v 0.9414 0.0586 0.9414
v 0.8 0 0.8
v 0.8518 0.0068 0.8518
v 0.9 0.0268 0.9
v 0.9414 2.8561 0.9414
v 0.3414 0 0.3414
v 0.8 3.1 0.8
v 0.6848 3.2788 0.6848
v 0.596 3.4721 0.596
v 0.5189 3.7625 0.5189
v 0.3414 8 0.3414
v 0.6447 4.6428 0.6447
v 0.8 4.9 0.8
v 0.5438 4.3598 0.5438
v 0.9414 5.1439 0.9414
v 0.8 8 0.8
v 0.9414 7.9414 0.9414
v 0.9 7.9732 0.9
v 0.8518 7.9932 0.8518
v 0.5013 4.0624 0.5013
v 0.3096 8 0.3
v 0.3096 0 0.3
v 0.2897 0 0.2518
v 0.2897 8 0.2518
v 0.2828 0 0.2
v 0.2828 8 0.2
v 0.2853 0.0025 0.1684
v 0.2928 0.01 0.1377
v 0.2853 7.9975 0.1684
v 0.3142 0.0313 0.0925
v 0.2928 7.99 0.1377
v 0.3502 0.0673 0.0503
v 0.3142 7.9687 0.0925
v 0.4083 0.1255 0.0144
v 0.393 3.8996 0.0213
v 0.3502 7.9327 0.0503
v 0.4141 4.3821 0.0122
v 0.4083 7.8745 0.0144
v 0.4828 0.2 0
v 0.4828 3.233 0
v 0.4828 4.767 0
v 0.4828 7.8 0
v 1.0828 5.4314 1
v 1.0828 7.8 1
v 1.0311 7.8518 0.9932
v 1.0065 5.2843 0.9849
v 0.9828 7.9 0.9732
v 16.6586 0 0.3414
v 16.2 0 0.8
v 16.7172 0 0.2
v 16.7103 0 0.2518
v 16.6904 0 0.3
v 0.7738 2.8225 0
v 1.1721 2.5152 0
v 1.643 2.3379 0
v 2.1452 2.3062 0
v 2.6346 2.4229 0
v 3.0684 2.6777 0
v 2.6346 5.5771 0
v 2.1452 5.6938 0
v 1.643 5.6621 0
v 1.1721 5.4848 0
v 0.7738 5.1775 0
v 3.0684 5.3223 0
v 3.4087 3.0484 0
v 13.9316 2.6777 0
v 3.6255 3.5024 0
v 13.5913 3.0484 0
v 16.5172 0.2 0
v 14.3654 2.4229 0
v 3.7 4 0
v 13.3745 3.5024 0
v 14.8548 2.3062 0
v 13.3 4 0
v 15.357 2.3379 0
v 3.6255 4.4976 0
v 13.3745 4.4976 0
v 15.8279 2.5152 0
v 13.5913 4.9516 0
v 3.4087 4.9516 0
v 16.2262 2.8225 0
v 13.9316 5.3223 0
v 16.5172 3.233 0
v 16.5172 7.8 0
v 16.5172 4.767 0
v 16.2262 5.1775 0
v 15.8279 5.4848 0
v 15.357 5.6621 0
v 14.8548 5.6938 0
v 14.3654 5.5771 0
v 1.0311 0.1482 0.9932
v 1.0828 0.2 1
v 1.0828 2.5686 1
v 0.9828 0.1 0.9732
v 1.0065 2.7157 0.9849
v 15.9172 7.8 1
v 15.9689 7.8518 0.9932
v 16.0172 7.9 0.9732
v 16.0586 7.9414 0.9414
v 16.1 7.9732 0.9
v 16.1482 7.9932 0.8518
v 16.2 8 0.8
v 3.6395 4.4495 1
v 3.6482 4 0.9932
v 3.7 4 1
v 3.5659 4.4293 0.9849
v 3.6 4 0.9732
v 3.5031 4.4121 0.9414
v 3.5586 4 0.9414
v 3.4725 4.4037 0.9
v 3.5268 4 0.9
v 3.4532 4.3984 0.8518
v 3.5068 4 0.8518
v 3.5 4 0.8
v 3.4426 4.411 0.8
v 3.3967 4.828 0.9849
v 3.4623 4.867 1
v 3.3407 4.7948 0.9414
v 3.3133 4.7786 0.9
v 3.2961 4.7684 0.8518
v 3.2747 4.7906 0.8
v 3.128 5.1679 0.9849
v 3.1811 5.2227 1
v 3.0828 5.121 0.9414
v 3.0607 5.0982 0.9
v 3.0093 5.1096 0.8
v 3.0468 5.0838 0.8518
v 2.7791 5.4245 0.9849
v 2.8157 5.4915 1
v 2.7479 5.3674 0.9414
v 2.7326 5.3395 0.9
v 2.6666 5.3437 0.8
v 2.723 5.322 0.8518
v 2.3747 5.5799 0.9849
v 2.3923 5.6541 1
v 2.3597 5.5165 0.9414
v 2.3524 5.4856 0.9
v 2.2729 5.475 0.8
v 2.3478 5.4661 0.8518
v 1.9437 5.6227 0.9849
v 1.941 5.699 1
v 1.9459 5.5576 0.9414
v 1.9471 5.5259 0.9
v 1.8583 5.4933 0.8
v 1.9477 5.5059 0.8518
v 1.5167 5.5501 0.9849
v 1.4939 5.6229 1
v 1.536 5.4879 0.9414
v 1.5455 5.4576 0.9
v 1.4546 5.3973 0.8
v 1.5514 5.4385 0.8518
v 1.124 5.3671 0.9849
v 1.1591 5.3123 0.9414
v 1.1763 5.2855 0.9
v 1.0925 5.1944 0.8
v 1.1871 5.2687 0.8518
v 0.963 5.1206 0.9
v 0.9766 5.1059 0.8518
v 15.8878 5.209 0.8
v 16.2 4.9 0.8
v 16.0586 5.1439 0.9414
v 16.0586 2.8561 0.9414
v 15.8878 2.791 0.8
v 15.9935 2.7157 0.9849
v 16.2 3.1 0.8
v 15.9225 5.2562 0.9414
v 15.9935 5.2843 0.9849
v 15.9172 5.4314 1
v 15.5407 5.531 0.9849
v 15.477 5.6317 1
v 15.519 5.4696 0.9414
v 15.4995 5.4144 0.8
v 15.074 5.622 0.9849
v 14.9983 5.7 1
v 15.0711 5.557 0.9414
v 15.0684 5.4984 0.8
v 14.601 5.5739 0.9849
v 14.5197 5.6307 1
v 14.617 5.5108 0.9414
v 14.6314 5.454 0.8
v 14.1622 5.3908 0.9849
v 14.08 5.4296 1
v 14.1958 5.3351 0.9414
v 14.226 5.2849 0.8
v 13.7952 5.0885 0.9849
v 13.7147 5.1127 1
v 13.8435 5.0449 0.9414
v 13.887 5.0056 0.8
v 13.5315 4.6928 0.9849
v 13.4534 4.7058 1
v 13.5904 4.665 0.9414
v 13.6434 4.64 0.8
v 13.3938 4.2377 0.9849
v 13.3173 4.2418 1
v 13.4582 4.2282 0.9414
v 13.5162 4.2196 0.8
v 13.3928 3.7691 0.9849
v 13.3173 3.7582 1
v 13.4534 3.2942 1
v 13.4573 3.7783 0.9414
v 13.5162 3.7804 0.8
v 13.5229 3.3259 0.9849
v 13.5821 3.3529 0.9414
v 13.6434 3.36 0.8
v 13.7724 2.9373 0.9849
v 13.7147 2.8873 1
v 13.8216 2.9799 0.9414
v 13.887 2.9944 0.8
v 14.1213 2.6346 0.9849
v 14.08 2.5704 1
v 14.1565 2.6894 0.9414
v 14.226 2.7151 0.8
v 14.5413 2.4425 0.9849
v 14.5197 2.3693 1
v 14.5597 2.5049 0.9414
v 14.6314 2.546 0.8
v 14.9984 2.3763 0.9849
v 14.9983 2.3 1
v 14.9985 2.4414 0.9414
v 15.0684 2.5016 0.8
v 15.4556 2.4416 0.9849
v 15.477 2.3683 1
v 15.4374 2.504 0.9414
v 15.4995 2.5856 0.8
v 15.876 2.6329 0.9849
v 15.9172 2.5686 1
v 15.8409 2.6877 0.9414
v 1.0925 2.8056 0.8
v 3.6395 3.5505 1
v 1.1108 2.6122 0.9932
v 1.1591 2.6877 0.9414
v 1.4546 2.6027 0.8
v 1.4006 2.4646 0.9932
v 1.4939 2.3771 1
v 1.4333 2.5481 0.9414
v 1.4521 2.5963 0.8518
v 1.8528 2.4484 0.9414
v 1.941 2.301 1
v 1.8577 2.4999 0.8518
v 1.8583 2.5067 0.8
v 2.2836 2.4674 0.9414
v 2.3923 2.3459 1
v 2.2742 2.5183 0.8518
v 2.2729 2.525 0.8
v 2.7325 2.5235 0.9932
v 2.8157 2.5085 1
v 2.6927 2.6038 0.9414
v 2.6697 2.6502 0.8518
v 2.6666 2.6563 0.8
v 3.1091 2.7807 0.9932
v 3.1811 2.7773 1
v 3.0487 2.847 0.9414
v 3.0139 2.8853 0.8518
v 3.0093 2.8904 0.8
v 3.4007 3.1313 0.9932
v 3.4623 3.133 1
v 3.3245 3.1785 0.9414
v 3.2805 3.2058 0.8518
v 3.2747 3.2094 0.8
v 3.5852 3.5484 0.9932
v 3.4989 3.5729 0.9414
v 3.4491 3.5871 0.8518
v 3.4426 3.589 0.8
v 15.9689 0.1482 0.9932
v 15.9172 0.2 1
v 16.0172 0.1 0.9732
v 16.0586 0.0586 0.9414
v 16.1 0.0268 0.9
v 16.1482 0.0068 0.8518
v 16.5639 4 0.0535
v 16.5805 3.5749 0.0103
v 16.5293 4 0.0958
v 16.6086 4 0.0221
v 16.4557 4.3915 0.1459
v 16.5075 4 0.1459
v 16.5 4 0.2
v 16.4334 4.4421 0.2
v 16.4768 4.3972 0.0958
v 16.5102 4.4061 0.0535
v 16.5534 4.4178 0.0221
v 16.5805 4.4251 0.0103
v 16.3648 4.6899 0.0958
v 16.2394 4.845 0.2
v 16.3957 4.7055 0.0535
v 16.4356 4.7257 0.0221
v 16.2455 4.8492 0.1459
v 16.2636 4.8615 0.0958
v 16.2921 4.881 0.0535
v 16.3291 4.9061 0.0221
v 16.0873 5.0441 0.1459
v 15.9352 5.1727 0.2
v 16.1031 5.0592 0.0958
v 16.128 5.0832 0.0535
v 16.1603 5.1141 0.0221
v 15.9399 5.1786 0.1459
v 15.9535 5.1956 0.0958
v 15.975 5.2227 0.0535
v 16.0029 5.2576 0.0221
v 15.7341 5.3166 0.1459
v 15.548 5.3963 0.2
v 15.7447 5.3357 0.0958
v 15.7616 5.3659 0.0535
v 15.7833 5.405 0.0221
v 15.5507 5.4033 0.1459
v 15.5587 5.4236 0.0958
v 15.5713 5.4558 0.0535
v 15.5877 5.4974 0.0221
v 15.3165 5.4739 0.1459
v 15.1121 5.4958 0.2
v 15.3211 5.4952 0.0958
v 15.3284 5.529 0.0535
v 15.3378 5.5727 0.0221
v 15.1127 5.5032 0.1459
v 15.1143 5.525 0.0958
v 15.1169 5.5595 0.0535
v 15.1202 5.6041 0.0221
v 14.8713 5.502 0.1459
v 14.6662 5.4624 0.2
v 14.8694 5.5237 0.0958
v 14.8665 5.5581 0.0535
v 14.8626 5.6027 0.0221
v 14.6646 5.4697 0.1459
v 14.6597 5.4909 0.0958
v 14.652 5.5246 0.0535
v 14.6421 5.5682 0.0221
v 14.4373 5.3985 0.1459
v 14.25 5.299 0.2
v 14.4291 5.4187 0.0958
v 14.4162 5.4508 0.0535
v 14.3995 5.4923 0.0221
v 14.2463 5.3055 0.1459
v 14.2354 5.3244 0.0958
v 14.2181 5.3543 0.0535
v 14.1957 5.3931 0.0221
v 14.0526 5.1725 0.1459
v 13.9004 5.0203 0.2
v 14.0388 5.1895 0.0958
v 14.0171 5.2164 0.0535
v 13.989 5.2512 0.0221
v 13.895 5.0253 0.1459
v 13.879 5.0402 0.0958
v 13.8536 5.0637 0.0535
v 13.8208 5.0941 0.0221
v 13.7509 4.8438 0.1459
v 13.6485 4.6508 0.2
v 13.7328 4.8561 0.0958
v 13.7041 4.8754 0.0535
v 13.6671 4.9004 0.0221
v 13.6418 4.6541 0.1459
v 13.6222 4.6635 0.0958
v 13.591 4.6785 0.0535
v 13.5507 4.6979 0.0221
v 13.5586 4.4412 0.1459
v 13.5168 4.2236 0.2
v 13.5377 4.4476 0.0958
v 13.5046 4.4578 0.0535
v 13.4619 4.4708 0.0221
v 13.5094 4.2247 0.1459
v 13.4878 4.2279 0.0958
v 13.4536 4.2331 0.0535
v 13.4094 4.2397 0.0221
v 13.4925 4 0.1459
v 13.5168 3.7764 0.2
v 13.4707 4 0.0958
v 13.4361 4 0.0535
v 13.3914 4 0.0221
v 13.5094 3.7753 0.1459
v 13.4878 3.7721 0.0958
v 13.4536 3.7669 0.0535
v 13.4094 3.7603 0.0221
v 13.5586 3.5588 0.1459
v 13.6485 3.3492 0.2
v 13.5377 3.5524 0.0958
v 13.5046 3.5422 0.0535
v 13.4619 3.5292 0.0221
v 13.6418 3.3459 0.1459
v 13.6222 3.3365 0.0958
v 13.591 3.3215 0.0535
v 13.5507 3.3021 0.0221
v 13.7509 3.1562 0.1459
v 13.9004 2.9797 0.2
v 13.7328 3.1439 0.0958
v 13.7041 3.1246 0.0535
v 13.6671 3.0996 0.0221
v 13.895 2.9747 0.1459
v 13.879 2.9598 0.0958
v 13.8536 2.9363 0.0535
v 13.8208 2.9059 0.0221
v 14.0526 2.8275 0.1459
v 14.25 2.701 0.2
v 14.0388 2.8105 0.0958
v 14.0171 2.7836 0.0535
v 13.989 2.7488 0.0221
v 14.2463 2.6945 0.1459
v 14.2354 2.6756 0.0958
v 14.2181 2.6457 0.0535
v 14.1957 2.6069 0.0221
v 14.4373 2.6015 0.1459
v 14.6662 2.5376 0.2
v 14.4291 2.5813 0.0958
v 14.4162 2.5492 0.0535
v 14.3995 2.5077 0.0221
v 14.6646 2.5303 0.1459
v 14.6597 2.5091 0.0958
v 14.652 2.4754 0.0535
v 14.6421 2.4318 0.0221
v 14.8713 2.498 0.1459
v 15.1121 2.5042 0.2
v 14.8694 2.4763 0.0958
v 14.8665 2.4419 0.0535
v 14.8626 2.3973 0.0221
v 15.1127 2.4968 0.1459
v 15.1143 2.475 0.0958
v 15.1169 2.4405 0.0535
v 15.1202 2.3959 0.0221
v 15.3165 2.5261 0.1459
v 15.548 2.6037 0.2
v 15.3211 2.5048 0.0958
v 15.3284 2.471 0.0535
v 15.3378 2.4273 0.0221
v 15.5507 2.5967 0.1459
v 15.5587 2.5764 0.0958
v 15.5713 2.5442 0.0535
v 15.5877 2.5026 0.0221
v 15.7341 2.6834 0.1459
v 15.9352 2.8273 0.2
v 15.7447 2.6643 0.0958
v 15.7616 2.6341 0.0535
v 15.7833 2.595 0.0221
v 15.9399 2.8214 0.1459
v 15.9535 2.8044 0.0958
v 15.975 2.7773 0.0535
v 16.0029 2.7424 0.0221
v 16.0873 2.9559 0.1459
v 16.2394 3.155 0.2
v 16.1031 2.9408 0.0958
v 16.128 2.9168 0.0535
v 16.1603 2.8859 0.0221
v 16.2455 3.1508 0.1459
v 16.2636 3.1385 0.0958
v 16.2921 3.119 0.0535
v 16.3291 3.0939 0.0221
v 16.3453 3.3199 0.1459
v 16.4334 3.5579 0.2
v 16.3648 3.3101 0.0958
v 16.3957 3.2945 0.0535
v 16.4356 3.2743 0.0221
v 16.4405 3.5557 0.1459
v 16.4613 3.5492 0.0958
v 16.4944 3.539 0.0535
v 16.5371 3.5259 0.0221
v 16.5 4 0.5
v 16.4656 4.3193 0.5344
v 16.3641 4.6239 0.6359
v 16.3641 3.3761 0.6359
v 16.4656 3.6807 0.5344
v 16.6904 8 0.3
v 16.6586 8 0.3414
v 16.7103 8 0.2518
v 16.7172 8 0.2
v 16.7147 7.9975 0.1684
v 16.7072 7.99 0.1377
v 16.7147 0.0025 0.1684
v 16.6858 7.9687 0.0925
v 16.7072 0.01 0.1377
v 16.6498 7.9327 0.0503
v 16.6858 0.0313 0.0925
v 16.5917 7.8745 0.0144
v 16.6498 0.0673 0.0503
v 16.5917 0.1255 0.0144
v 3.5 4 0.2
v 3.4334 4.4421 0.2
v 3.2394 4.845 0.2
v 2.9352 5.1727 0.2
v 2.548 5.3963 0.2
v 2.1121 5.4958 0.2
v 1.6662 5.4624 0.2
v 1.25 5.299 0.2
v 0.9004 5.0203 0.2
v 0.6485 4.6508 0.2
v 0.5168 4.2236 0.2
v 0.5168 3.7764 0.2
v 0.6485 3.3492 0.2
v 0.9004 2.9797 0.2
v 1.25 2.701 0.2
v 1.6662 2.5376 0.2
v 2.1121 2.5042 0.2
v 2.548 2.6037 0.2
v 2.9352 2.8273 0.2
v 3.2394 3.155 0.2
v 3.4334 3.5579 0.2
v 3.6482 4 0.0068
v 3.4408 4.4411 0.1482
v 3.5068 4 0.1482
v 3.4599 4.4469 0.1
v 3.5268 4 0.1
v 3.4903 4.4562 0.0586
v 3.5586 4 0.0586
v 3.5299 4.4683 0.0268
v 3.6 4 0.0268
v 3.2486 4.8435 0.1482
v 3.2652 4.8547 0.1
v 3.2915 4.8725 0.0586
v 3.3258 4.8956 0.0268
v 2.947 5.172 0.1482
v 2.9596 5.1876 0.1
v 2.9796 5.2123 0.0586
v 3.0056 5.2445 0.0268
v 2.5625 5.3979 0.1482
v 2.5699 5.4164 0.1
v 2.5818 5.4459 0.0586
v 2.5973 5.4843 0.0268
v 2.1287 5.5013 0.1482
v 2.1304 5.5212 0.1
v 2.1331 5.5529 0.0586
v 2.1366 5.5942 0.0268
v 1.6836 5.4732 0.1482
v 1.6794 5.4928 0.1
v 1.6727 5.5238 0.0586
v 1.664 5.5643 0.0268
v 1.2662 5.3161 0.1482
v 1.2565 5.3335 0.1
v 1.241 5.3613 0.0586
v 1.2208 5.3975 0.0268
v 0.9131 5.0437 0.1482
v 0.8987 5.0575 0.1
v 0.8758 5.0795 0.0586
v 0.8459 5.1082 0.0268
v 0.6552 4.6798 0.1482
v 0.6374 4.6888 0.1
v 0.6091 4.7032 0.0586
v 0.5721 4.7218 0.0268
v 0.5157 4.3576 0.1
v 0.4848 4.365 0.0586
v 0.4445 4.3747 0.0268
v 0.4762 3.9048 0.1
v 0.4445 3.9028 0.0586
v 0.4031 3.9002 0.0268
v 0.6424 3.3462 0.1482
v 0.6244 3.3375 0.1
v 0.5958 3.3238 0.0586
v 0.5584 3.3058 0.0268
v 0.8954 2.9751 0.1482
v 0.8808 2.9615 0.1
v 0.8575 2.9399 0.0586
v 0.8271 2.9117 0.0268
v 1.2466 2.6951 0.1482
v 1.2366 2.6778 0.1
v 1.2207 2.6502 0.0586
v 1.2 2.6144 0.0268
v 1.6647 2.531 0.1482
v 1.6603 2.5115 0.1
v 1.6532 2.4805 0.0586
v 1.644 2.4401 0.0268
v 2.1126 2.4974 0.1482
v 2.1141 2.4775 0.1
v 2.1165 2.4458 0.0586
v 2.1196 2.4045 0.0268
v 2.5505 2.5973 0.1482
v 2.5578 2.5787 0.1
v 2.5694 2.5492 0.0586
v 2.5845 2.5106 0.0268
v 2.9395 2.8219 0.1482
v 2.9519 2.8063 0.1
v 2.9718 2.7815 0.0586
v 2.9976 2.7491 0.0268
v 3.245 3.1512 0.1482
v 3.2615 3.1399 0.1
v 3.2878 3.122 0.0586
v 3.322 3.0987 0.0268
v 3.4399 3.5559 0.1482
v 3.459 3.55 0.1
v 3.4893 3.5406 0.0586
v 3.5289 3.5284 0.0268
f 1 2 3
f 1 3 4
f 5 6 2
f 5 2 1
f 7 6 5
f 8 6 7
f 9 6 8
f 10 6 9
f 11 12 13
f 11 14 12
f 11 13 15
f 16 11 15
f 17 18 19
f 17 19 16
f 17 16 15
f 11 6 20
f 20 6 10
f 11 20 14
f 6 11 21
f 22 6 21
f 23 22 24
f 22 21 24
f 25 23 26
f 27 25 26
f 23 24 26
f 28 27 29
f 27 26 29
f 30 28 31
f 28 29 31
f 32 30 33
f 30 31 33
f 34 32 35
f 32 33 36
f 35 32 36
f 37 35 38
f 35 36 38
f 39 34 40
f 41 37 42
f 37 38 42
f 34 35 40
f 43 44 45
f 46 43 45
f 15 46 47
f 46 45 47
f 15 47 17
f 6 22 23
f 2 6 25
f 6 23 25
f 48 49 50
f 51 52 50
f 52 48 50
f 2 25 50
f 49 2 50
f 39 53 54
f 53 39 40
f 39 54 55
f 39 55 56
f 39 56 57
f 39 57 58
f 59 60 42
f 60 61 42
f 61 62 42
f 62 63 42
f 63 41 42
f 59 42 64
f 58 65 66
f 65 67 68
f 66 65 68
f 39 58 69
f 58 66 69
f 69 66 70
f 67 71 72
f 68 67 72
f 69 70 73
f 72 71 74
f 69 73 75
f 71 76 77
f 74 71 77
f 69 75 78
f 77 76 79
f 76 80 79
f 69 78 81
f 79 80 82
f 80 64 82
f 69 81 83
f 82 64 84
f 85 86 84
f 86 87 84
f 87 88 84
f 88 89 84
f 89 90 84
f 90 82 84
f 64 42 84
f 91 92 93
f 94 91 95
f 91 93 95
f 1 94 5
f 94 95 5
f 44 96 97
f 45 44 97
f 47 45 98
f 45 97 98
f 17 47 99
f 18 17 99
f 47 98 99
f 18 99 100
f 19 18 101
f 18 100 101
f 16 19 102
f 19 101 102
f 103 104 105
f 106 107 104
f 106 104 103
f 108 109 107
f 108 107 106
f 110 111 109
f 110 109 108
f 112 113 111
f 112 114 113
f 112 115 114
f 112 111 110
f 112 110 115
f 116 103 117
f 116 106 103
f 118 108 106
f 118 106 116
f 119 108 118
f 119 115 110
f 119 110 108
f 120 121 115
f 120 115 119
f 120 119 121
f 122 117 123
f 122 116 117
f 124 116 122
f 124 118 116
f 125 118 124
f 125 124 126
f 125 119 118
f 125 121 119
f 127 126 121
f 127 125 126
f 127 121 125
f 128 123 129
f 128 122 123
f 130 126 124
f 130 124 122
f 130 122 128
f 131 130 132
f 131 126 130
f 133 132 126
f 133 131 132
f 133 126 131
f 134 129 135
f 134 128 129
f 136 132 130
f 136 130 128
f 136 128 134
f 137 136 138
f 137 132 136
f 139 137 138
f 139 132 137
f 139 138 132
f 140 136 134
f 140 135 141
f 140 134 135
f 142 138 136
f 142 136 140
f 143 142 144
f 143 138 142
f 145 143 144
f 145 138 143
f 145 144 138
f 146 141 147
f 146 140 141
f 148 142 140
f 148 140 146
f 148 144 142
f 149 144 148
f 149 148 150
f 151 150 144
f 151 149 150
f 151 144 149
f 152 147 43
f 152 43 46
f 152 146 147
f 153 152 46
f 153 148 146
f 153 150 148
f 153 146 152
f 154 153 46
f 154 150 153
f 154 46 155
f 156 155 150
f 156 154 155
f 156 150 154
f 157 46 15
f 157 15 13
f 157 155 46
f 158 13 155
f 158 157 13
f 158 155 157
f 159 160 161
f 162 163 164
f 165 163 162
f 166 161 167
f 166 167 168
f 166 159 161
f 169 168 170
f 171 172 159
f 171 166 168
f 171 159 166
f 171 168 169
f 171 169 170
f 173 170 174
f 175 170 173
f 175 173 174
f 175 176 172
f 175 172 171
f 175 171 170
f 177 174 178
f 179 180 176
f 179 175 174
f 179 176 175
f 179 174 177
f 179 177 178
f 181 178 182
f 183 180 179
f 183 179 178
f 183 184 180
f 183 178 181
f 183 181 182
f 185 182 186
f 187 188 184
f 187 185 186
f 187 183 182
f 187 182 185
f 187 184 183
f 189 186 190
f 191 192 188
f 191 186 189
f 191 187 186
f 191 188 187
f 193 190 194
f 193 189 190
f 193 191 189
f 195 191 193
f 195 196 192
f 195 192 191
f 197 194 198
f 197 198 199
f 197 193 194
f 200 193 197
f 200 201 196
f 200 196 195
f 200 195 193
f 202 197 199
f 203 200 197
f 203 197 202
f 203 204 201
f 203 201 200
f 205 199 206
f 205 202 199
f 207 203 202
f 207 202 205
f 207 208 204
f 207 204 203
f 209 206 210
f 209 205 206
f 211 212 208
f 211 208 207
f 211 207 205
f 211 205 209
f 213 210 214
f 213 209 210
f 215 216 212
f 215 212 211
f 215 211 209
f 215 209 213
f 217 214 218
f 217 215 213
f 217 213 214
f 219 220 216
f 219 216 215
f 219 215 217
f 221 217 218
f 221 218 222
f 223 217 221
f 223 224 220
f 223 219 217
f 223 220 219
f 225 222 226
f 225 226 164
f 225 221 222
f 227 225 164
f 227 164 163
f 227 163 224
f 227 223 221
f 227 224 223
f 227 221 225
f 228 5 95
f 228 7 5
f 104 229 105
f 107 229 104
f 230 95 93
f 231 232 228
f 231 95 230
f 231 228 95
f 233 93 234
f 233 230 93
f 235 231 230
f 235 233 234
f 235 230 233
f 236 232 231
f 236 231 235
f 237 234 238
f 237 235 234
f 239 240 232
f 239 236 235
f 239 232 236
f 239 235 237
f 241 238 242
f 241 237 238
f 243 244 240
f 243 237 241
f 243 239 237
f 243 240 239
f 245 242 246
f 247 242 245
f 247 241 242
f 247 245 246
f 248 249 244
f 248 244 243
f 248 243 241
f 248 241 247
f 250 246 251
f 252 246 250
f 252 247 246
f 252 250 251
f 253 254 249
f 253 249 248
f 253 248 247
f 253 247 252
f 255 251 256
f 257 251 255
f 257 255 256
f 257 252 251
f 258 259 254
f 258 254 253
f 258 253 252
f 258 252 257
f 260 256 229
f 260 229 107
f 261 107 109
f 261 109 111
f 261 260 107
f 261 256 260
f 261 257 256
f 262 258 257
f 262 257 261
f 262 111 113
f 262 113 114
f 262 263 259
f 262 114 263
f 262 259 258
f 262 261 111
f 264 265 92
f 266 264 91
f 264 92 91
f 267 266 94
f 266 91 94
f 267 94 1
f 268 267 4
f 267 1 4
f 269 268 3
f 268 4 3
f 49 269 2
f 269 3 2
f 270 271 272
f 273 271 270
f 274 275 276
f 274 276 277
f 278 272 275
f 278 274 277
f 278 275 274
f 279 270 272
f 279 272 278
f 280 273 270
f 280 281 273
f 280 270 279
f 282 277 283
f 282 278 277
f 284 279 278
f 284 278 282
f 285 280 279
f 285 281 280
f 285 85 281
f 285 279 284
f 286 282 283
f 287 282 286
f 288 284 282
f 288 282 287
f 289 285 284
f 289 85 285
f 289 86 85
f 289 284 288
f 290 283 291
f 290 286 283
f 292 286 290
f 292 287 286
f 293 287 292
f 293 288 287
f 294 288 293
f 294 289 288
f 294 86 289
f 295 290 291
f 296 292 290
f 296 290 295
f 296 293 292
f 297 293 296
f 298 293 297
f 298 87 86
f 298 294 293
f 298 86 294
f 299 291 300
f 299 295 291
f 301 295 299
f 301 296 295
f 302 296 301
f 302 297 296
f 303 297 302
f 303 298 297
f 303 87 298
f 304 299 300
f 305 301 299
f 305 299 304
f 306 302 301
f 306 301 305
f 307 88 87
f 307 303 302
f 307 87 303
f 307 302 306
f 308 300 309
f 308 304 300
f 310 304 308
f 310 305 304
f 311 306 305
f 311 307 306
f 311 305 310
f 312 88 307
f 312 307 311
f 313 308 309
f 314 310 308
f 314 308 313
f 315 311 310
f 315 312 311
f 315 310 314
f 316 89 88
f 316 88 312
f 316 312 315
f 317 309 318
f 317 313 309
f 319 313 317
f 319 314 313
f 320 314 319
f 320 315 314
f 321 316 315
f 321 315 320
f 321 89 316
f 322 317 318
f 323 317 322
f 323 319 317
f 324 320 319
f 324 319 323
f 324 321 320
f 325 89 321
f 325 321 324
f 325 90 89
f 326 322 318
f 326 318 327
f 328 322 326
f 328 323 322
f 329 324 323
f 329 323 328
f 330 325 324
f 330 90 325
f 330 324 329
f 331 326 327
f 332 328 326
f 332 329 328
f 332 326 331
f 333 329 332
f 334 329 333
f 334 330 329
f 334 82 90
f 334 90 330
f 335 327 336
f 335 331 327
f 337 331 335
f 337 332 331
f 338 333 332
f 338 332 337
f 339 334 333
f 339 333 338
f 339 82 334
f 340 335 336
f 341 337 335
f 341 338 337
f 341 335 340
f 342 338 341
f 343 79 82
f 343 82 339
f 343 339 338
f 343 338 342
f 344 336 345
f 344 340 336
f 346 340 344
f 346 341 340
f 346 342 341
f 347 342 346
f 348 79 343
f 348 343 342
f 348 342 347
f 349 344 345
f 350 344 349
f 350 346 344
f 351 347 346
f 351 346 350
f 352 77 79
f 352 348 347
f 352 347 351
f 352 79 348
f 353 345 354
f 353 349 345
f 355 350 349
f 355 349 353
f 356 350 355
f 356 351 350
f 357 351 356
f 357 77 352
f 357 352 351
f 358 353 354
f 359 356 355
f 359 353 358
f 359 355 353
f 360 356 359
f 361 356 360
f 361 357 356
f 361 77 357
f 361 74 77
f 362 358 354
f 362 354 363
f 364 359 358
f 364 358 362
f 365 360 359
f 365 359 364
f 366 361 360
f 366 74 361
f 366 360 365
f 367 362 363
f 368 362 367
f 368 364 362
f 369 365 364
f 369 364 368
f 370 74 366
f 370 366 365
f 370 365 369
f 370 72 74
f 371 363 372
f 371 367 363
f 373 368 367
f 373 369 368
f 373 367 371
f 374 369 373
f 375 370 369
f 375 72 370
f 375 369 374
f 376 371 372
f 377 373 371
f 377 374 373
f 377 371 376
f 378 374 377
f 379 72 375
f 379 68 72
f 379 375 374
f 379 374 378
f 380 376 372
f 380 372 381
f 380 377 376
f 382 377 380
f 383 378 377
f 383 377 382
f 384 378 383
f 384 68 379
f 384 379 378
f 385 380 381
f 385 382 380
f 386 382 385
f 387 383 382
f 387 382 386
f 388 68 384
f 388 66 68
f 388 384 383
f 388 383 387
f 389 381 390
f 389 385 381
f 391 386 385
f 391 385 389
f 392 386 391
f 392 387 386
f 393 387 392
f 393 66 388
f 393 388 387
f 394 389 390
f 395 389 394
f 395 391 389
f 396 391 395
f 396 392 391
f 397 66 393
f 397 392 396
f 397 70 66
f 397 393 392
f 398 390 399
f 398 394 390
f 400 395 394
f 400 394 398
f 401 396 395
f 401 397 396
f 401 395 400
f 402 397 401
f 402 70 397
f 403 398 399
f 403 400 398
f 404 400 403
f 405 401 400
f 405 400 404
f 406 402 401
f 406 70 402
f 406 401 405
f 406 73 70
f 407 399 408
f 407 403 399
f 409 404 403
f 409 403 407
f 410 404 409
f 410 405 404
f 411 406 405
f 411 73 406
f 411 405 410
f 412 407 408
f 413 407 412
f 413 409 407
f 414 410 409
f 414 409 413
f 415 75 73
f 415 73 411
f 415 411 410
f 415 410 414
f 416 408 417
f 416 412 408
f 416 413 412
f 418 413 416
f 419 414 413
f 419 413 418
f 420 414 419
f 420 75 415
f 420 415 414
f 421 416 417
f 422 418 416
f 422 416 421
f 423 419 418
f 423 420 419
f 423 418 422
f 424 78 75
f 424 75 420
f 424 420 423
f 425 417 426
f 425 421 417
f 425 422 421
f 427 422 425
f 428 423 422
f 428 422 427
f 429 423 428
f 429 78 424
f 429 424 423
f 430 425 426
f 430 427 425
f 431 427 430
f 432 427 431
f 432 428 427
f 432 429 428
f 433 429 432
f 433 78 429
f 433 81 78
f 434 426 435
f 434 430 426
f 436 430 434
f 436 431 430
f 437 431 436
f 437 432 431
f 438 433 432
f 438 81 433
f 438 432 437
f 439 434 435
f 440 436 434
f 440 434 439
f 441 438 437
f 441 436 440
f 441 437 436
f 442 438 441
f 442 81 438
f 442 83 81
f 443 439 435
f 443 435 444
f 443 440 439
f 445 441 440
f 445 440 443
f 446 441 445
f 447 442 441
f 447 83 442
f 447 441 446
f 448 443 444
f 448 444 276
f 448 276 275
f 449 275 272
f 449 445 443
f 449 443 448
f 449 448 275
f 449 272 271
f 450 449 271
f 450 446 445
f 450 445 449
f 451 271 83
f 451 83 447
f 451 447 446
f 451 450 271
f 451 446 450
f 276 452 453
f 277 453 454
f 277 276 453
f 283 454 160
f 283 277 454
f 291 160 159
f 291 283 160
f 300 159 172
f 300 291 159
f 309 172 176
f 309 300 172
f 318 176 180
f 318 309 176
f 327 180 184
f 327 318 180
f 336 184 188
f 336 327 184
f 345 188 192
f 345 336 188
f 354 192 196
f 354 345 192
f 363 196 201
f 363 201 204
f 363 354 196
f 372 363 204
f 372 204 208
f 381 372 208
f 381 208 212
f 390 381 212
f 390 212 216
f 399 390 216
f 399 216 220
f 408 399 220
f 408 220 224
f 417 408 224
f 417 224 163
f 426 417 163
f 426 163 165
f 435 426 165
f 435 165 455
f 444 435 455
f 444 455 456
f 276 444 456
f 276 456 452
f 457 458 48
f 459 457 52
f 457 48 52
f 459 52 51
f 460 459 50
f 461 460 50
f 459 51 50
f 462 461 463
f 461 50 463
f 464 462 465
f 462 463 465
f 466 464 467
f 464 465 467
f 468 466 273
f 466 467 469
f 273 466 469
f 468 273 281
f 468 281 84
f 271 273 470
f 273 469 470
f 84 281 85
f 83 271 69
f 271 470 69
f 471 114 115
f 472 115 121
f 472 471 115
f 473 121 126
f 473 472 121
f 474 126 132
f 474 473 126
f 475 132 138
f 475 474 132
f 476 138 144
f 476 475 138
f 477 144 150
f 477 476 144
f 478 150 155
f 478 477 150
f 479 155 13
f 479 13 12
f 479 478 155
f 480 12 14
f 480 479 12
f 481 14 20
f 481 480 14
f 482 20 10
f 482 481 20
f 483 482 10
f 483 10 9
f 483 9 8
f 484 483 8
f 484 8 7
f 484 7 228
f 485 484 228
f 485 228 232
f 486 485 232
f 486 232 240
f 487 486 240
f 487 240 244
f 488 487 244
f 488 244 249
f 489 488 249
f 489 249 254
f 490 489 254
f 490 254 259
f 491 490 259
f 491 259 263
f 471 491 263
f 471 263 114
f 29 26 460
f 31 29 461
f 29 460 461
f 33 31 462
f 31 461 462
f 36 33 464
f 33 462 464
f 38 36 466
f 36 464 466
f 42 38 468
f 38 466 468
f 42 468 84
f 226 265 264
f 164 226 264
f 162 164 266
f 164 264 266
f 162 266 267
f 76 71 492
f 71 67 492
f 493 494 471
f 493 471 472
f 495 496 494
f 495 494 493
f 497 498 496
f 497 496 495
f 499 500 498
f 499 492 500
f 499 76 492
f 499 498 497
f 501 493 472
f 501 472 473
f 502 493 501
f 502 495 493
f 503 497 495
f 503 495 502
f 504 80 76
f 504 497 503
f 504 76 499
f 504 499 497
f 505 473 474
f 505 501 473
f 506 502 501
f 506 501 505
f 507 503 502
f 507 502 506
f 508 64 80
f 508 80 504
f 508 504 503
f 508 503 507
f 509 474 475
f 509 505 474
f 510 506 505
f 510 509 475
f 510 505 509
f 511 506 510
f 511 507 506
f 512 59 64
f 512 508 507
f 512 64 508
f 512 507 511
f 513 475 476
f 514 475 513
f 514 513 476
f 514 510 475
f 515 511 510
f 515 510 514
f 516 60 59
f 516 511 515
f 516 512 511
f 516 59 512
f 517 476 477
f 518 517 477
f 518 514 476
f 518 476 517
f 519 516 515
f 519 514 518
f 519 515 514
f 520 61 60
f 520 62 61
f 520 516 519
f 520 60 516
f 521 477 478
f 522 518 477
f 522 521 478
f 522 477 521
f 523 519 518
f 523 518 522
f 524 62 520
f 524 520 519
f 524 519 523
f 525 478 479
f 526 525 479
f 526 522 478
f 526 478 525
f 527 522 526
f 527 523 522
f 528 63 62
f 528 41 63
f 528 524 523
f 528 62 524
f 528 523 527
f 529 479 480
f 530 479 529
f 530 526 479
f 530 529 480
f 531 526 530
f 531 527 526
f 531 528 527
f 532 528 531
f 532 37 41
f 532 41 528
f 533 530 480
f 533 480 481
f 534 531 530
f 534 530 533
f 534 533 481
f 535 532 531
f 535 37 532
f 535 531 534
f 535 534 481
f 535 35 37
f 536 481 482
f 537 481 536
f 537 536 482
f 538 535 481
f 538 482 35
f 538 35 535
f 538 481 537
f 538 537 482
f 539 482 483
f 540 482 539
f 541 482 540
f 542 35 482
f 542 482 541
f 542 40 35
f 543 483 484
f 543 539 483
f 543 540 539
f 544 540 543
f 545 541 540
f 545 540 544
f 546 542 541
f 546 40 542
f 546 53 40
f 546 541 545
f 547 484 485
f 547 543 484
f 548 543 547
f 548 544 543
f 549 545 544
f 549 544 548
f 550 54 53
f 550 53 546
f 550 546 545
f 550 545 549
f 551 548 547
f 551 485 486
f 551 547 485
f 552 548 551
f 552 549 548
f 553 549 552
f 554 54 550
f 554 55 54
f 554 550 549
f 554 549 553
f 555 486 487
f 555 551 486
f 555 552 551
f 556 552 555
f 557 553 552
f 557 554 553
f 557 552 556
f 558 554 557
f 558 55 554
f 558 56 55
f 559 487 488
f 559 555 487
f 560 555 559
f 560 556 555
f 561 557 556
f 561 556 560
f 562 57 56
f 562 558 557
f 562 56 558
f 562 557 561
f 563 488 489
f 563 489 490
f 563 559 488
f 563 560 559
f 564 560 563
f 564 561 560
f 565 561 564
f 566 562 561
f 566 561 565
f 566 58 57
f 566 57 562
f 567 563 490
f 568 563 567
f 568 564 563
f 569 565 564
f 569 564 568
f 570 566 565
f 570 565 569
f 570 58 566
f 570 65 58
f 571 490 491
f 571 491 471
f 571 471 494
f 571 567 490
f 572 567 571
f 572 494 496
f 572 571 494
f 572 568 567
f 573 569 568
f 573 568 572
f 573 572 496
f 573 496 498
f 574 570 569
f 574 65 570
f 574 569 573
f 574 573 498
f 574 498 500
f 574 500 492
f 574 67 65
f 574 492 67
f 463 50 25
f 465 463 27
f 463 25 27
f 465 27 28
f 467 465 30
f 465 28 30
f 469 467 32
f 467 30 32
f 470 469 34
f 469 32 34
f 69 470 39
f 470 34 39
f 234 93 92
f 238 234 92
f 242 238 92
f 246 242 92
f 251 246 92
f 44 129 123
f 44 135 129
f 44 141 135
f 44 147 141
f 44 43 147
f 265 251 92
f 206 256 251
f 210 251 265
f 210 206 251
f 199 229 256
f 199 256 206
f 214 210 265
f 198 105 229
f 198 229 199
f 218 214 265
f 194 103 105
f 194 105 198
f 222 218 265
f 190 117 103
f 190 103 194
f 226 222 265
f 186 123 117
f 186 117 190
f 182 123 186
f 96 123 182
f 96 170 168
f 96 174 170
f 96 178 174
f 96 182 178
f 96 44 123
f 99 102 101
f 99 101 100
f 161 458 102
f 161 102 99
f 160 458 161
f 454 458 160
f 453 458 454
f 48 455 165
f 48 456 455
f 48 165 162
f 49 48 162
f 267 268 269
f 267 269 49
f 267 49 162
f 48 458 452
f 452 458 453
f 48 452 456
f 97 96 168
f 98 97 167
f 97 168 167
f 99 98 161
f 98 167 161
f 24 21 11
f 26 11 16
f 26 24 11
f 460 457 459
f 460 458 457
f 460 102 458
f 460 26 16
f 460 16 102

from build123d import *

# Parameters (mm, degrees)
ESQUISSE1_W        = 17
ESQUISSE1_H        = 8
ESQUISSE1_R        = 1.5
BOSS_EXTRU_1_DEPTH = 1
CHANFREIN1_SIZE    = 1
CONG_1_R           = 0.2


with BuildPart() as part:
    # Esquisse1 → Boss.-Extru.1 (new body)
    with BuildSketch(Plane.XY):
        with Locations((8.5, 4)):
            Rectangle(ESQUISSE1_W, ESQUISSE1_H)
        with Locations((2, 4)):
            Circle(ESQUISSE1_R, mode=Mode.SUBTRACT)
        with Locations((15, 4)):
            Circle(ESQUISSE1_R, mode=Mode.SUBTRACT)
    extrude(amount=BOSS_EXTRU_1_DEPTH)

    # Chanfrein1
    # the kernel refuses this chamfer: 1 mm, written as the material it takes off along each edge
    with BuildSketch(Plane(origin=(17, -2.571682988, 1), x_dir=(0.02749587661058563, 0, -0.9996219169112968), z_dir=(0, 1, 0)), Plane(origin=(0, 10.571682988, 1), x_dir=(-0.027495876610586372, 0, -0.9996219169112968), z_dir=(0, -1, 0))) as chanfrein1_piece_1:
        Polygon((CHANFREIN1_SIZE * 0.999621916911, CHANFREIN1_SIZE * 0.0274958766106), (-CHANFREIN1_SIZE * 0.0274958766106, CHANFREIN1_SIZE * 0.999621916911), (0, 0), align=None)
    extrude(amount=13.143365976, mode=Mode.SUBTRACT)

    # Congé1
    # the kernel refuses this fillet: 0.2 mm, written as the material it takes off along each edge
    with BuildSketch(Plane(origin=(15, 4, 0), x_dir=(1, 0, 0), z_dir=(0, -1, 0))) as cong_1_piece_1:
        with BuildLine():
            CenterArc((1.5 + CONG_1_R, CONG_1_R), CONG_1_R, 180, 90)
            Line((1.5, CONG_1_R), (1.5, 0))
            Line((1.5, 0), (1.5 + CONG_1_R, 0))
        make_face()
    revolve(axis=Axis((15, 4, 0), (0, 0, 1)), mode=Mode.SUBTRACT)
    with BuildSketch(Plane(origin=(-0.5, 0, 0), x_dir=(0, 0, 1), z_dir=(1, 0, 0))) as cong_1_piece_2:
        with BuildLine():
            CenterArc((CONG_1_R, -CONG_1_R), CONG_1_R, 90, 90)
            Line((0, -CONG_1_R), (0, 0))
            Line((0, 0), (CONG_1_R, 0))
        make_face()
    extrude(amount=18, mode=Mode.SUBTRACT)
    with BuildSketch(Plane(origin=(17, -1.207106781, 0), x_dir=(-1, 0, 0), z_dir=(0, 1, 0)), Plane(origin=(0, 9.207106781, 0), x_dir=(1, 0, 0), z_dir=(0, -1, 0))) as cong_1_piece_3:
        with BuildLine():
            CenterArc((CONG_1_R * 2.41421356237, CONG_1_R), CONG_1_R, 135, 135)
            Line((CONG_1_R * 1.70710678119, CONG_1_R * 1.70710678119), (0, 0))
            Line((0, 0), (CONG_1_R * 2.41421356237, 0))
        make_face()
    extrude(amount=10.414213562, mode=Mode.SUBTRACT)
    with BuildSketch(Plane(origin=(17.5, 8, 0), x_dir=(0, -1, 0), z_dir=(-1, 0, 0))) as cong_1_piece_4:
        with BuildLine():
            CenterArc((CONG_1_R, CONG_1_R), CONG_1_R, 180, 90)
            Line((0, CONG_1_R), (0, 0))
            Line((0, 0), (CONG_1_R, 0))
        make_face()
    extrude(amount=18, mode=Mode.SUBTRACT)
    with BuildSketch(Plane(origin=(2, 4, 0), x_dir=(1, 0, 0), z_dir=(0, -1, 0))) as cong_1_piece_5:
        with BuildLine():
            CenterArc((1.5 + CONG_1_R, CONG_1_R), CONG_1_R, 180, 90)
            Line((1.5, CONG_1_R), (1.5, 0))
            Line((1.5, 0), (1.5 + CONG_1_R, 0))
        make_face()
    revolve(axis=Axis((2, 4, 0), (0, 0, 1)), mode=Mode.SUBTRACT)
    with BuildSketch(Plane(origin=(1, 3.089072792, 1), x_dir=(1, 0, 0), z_dir=(0, -1, 0)), Plane(origin=(1, 8.207106781, 1), x_dir=(1, 0, 0), z_dir=(0, -1, 0))) as cong_1_piece_6:
        with BuildLine():
            CenterArc((CONG_1_R * 0.414213562373, -CONG_1_R), CONG_1_R, 90, 45)
            Line((-CONG_1_R * 0.292893218813, -CONG_1_R * 0.292893218813), (0, 0))
            Line((0, 0), (CONG_1_R * 0.414213562373, 0))
        make_face()
    extrude(amount=3.296179574, mode=Mode.SUBTRACT)
    with BuildSketch(Plane(origin=(2, 4, 1), x_dir=(-0.8739874769428458, -0.4859484439187749, 0), z_dir=(-0.4859484439187749, 0.8739874769428458, 0))) as cong_1_piece_7:
        with BuildLine():
            CenterArc((1.5 + CONG_1_R, -CONG_1_R), CONG_1_R, 90, 90)
            Line((1.5, -CONG_1_R), (1.5, 0))
            Line((1.5, 0), (1.5 + CONG_1_R, 0))
        make_face()
    revolve(axis=Axis((2, 4, 1), (0, 0, 1)), revolution_arc=150.925369424, mode=Mode.SUBTRACT)
    with BuildSketch(Plane(origin=(16.5, 8, 1), x_dir=(0, -1, 0), z_dir=(-1, 0, 0))) as cong_1_piece_8:
        with BuildLine():
            CenterArc((CONG_1_R, -CONG_1_R), CONG_1_R, 90, 90)
            Line((0, -CONG_1_R), (0, 0))
            Line((0, 0), (CONG_1_R, 0))
        make_face()
    extrude(amount=16, mode=Mode.SUBTRACT)
    with BuildSketch(Plane(origin=(16, 4.910927208, 1), x_dir=(0.707106781186839, 0, -0.707106781186256), z_dir=(0, 1, 0)), Plane(origin=(16, -0.207106781, 1), x_dir=(0.707106781186839, 0, -0.707106781186256), z_dir=(0, 1, 0))) as cong_1_piece_9:
        with BuildLine():
            CenterArc((CONG_1_R * 0.414213562373, CONG_1_R), CONG_1_R, 225, 45)
            Line((-CONG_1_R * 0.292893218813, CONG_1_R * 0.292893218813), (0, 0))
            Line((0, 0), (CONG_1_R * 0.414213562373, 0))
        make_face()
    extrude(amount=3.296179574, mode=Mode.SUBTRACT)
    with BuildSketch(Plane(origin=(15, 4, 1), x_dir=(0.8744070091205912, 0.48519313927629093, 0), z_dir=(0.48519313927629093, -0.8744070091205912, 0))) as cong_1_piece_10:
        with BuildLine():
            CenterArc((1.5 + CONG_1_R, -CONG_1_R), CONG_1_R, 90, 90)
            Line((1.5, -CONG_1_R), (1.5, 0))
            Line((1.5, 0), (1.5 + CONG_1_R, 0))
        make_face()
    revolve(axis=Axis((15, 4, 1), (0, 0, 1)), revolution_arc=301.949745716, mode=Mode.SUBTRACT)
    with BuildSketch(Plane(origin=(0.5, 0, 1), x_dir=(0, 0, -1), z_dir=(1, 0, 0))) as cong_1_piece_11:
        with BuildLine():
            CenterArc((CONG_1_R, CONG_1_R), CONG_1_R, 180, 90)
            Line((0, CONG_1_R), (0, 0))
            Line((0, 0), (CONG_1_R, 0))
        make_face()
    extrude(amount=16, mode=Mode.SUBTRACT)
    with BuildSketch(Plane(origin=(2, 4, 1), x_dir=(1, 0, 0), z_dir=(0, -1, 0))) as cong_1_piece_12:
        with BuildLine():
            CenterArc((1.5 + CONG_1_R, -CONG_1_R), CONG_1_R, 90, 90)
            Line((1.5, -CONG_1_R), (1.5, 0))
            Line((1.5, 0), (1.5 + CONG_1_R, 0))
        make_face()
    revolve(axis=Axis((2, 4, 1), (0, 0, 1)), revolution_arc=150.925369424, mode=Mode.SUBTRACT)


solid = part.part
